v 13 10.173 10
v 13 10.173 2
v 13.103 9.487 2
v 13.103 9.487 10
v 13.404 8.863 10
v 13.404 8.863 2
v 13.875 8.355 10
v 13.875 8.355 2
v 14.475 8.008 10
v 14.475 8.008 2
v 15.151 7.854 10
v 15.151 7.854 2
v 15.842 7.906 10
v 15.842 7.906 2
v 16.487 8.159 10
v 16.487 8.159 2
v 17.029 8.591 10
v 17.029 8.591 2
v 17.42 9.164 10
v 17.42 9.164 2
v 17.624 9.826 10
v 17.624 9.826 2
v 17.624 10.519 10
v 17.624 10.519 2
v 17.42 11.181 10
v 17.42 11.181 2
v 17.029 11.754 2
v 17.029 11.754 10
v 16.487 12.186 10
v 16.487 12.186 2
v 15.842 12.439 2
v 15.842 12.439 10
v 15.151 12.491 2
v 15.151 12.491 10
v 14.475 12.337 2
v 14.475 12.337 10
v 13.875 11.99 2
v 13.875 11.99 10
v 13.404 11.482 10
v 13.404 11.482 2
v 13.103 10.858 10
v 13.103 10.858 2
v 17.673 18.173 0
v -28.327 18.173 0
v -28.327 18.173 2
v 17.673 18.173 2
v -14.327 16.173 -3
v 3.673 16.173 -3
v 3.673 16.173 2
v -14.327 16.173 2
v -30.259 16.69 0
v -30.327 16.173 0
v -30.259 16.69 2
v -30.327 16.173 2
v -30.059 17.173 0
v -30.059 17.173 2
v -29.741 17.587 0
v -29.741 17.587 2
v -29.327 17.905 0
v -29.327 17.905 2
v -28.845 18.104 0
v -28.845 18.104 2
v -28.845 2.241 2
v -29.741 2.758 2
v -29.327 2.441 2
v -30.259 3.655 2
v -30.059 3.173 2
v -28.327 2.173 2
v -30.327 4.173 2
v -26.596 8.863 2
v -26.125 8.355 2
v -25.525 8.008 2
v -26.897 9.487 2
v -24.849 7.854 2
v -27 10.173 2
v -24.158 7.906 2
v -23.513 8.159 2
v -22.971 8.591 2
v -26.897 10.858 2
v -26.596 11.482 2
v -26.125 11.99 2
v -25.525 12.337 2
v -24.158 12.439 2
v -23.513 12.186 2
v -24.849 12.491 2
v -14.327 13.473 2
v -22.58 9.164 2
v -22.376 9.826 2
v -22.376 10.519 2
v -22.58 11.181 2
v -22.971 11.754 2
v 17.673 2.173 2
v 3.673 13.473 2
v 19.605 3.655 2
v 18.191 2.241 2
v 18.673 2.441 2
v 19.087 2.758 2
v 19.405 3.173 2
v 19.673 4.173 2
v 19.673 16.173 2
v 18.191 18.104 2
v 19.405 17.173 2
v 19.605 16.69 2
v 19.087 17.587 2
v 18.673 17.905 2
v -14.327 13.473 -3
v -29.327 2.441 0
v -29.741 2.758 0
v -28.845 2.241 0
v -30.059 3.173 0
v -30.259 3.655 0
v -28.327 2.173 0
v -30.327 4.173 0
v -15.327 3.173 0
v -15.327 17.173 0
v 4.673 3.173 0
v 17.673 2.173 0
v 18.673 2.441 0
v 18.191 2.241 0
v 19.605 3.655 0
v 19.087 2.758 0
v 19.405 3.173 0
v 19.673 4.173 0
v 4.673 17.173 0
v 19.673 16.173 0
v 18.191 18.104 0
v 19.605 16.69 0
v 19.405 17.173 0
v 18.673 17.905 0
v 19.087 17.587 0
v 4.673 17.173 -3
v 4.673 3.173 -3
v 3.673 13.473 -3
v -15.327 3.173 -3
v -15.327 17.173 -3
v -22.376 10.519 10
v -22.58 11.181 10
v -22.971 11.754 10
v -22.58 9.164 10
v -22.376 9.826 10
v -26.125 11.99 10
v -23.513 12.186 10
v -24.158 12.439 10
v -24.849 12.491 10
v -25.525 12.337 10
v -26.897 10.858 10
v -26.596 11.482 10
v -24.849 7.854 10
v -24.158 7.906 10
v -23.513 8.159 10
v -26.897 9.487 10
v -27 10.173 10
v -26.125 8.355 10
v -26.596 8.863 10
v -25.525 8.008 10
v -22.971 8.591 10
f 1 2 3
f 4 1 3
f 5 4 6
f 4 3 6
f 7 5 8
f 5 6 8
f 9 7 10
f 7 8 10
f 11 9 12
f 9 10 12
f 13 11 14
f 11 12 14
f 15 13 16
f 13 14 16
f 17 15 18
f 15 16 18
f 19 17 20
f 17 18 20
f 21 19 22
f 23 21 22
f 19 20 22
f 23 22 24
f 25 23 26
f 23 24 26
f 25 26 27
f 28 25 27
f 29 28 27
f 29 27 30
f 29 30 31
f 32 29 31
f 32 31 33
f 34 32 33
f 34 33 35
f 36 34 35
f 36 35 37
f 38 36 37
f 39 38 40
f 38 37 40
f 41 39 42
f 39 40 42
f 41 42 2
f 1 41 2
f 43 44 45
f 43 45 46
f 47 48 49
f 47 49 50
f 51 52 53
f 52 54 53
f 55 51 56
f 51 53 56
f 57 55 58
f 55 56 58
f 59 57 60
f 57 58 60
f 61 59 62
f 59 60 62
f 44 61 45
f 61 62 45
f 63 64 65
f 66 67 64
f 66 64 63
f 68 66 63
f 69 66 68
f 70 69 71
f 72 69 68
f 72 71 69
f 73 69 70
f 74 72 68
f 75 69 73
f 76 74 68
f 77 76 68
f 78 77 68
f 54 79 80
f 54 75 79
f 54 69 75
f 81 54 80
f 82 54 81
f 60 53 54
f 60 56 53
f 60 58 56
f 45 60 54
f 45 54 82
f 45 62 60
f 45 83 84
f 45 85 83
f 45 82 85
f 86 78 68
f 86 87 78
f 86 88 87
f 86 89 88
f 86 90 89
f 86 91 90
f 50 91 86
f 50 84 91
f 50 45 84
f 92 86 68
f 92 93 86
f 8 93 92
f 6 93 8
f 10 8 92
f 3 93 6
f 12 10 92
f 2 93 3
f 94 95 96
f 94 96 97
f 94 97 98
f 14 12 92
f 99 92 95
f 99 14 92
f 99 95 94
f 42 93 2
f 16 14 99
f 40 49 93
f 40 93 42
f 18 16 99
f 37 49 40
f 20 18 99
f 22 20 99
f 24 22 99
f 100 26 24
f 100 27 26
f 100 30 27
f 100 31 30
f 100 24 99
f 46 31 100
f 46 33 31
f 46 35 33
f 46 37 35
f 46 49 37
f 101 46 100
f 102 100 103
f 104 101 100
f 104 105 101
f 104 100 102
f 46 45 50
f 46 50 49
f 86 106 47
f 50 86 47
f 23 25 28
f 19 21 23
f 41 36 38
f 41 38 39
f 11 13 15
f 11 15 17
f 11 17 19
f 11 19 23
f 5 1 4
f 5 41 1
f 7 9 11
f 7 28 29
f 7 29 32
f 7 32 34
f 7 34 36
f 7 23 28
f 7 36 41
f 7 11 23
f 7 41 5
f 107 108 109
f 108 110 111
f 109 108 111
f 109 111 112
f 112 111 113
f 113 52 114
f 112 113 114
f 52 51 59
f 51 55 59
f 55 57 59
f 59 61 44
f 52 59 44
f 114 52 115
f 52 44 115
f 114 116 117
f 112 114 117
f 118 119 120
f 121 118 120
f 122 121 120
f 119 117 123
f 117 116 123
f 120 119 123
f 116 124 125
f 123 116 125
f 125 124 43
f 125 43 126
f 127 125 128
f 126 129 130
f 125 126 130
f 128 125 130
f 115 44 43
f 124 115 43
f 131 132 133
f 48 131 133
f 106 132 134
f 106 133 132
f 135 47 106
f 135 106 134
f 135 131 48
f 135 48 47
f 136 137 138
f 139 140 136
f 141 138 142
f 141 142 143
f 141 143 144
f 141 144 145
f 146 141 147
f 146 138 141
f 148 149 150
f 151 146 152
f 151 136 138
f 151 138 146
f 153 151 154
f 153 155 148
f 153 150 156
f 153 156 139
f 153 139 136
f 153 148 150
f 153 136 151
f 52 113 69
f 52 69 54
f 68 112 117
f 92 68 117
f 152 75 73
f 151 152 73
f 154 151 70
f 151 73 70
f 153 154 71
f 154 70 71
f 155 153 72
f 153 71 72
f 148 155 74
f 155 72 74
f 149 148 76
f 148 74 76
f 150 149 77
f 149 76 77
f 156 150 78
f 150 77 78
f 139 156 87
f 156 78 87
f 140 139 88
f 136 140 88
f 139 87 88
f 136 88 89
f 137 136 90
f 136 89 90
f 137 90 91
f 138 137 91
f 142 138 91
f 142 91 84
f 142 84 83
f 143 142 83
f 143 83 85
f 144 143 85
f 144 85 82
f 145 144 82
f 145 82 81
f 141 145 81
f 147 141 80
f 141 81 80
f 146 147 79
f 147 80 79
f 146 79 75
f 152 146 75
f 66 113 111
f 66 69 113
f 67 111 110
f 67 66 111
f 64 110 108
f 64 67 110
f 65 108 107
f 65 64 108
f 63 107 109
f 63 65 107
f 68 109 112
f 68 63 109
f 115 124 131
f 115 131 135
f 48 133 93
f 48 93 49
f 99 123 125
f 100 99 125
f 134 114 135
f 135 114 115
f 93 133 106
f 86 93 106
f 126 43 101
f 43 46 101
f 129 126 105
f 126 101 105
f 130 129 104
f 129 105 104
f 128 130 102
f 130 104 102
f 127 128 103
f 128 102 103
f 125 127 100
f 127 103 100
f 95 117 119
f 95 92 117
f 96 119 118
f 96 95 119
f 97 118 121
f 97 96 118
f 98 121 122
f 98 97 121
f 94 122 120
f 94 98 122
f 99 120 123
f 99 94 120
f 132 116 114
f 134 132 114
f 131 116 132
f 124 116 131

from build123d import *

# Parameters (mm, degrees)
SKETCH1_W           = 50
SKETCH1_H           = 16
BOSS_EXTRUDE1_DEPTH = 2
SKETCH2_R           = 2.325
BOSS_EXTRUDE2_DEPTH = 8
FILLET1_R           = 2
SKETCH3_W           = 20
SKETCH3_H           = 14
BOSS_EXTRUDE3_DEPTH = 3
SKETCH6_W           = 18
SKETCH6_H           = 2.7
CUT_EXTRUDE1_DEPTH  = 5


with BuildPart() as part:
    # Sketch1 → Boss-Extrude1 (new body)
    with BuildSketch(Plane.XY):
        with Locations((-5.32694175, 10.172569161)):
            Rectangle(SKETCH1_W, SKETCH1_H)
    extrude(amount=BOSS_EXTRUDE1_DEPTH)

    # Sketch2 → Boss-Extrude2 (add)
    with BuildSketch(Plane.XY.offset(2)):
        with Locations(Location((-24.675197488, 10.172569161, 0), (0, 0, 180))):
            Circle(SKETCH2_R)
        with Locations(Location((15.324802512, 10.172569161, 0), (0, 0, 180))):
            Circle(SKETCH2_R)
    extrude(amount=BOSS_EXTRUDE2_DEPTH)

    # Fillet1
    fillet1_edges = [part.edges().sort_by_distance(p)[0] for p in [
        (19.67305825, 2.172569161, 1),
        (-30.32694175, 2.172569161, 1),
        (-30.32694175, 18.172569161, 1),
        (19.67305825, 18.172569161, 1),
    ]]
    fillet(fillet1_edges, radius=FILLET1_R)

    # Sketch3 → Boss-Extrude3 (add)
    with BuildSketch(Plane(origin=(0, 0, 0), x_dir=(-1, 0, 0), z_dir=(0, 0, -1))):
        with Locations((5.32694175, 10.172569161)):
            Rectangle(SKETCH3_W, SKETCH3_H)
    extrude(amount=BOSS_EXTRUDE3_DEPTH)

    # Sketch6 → Cut-Extrude1 (cut)
    with BuildSketch(Plane(origin=(0, 0, -3), x_dir=(-1, 0, 0), z_dir=(0, 0, -1))):
        with Locations((5.32694175, 14.822569161)):
            Rectangle(SKETCH6_W, SKETCH6_H)
    extrude(amount=-CUT_EXTRUDE1_DEPTH, mode=Mode.SUBTRACT)


solid = part.part
